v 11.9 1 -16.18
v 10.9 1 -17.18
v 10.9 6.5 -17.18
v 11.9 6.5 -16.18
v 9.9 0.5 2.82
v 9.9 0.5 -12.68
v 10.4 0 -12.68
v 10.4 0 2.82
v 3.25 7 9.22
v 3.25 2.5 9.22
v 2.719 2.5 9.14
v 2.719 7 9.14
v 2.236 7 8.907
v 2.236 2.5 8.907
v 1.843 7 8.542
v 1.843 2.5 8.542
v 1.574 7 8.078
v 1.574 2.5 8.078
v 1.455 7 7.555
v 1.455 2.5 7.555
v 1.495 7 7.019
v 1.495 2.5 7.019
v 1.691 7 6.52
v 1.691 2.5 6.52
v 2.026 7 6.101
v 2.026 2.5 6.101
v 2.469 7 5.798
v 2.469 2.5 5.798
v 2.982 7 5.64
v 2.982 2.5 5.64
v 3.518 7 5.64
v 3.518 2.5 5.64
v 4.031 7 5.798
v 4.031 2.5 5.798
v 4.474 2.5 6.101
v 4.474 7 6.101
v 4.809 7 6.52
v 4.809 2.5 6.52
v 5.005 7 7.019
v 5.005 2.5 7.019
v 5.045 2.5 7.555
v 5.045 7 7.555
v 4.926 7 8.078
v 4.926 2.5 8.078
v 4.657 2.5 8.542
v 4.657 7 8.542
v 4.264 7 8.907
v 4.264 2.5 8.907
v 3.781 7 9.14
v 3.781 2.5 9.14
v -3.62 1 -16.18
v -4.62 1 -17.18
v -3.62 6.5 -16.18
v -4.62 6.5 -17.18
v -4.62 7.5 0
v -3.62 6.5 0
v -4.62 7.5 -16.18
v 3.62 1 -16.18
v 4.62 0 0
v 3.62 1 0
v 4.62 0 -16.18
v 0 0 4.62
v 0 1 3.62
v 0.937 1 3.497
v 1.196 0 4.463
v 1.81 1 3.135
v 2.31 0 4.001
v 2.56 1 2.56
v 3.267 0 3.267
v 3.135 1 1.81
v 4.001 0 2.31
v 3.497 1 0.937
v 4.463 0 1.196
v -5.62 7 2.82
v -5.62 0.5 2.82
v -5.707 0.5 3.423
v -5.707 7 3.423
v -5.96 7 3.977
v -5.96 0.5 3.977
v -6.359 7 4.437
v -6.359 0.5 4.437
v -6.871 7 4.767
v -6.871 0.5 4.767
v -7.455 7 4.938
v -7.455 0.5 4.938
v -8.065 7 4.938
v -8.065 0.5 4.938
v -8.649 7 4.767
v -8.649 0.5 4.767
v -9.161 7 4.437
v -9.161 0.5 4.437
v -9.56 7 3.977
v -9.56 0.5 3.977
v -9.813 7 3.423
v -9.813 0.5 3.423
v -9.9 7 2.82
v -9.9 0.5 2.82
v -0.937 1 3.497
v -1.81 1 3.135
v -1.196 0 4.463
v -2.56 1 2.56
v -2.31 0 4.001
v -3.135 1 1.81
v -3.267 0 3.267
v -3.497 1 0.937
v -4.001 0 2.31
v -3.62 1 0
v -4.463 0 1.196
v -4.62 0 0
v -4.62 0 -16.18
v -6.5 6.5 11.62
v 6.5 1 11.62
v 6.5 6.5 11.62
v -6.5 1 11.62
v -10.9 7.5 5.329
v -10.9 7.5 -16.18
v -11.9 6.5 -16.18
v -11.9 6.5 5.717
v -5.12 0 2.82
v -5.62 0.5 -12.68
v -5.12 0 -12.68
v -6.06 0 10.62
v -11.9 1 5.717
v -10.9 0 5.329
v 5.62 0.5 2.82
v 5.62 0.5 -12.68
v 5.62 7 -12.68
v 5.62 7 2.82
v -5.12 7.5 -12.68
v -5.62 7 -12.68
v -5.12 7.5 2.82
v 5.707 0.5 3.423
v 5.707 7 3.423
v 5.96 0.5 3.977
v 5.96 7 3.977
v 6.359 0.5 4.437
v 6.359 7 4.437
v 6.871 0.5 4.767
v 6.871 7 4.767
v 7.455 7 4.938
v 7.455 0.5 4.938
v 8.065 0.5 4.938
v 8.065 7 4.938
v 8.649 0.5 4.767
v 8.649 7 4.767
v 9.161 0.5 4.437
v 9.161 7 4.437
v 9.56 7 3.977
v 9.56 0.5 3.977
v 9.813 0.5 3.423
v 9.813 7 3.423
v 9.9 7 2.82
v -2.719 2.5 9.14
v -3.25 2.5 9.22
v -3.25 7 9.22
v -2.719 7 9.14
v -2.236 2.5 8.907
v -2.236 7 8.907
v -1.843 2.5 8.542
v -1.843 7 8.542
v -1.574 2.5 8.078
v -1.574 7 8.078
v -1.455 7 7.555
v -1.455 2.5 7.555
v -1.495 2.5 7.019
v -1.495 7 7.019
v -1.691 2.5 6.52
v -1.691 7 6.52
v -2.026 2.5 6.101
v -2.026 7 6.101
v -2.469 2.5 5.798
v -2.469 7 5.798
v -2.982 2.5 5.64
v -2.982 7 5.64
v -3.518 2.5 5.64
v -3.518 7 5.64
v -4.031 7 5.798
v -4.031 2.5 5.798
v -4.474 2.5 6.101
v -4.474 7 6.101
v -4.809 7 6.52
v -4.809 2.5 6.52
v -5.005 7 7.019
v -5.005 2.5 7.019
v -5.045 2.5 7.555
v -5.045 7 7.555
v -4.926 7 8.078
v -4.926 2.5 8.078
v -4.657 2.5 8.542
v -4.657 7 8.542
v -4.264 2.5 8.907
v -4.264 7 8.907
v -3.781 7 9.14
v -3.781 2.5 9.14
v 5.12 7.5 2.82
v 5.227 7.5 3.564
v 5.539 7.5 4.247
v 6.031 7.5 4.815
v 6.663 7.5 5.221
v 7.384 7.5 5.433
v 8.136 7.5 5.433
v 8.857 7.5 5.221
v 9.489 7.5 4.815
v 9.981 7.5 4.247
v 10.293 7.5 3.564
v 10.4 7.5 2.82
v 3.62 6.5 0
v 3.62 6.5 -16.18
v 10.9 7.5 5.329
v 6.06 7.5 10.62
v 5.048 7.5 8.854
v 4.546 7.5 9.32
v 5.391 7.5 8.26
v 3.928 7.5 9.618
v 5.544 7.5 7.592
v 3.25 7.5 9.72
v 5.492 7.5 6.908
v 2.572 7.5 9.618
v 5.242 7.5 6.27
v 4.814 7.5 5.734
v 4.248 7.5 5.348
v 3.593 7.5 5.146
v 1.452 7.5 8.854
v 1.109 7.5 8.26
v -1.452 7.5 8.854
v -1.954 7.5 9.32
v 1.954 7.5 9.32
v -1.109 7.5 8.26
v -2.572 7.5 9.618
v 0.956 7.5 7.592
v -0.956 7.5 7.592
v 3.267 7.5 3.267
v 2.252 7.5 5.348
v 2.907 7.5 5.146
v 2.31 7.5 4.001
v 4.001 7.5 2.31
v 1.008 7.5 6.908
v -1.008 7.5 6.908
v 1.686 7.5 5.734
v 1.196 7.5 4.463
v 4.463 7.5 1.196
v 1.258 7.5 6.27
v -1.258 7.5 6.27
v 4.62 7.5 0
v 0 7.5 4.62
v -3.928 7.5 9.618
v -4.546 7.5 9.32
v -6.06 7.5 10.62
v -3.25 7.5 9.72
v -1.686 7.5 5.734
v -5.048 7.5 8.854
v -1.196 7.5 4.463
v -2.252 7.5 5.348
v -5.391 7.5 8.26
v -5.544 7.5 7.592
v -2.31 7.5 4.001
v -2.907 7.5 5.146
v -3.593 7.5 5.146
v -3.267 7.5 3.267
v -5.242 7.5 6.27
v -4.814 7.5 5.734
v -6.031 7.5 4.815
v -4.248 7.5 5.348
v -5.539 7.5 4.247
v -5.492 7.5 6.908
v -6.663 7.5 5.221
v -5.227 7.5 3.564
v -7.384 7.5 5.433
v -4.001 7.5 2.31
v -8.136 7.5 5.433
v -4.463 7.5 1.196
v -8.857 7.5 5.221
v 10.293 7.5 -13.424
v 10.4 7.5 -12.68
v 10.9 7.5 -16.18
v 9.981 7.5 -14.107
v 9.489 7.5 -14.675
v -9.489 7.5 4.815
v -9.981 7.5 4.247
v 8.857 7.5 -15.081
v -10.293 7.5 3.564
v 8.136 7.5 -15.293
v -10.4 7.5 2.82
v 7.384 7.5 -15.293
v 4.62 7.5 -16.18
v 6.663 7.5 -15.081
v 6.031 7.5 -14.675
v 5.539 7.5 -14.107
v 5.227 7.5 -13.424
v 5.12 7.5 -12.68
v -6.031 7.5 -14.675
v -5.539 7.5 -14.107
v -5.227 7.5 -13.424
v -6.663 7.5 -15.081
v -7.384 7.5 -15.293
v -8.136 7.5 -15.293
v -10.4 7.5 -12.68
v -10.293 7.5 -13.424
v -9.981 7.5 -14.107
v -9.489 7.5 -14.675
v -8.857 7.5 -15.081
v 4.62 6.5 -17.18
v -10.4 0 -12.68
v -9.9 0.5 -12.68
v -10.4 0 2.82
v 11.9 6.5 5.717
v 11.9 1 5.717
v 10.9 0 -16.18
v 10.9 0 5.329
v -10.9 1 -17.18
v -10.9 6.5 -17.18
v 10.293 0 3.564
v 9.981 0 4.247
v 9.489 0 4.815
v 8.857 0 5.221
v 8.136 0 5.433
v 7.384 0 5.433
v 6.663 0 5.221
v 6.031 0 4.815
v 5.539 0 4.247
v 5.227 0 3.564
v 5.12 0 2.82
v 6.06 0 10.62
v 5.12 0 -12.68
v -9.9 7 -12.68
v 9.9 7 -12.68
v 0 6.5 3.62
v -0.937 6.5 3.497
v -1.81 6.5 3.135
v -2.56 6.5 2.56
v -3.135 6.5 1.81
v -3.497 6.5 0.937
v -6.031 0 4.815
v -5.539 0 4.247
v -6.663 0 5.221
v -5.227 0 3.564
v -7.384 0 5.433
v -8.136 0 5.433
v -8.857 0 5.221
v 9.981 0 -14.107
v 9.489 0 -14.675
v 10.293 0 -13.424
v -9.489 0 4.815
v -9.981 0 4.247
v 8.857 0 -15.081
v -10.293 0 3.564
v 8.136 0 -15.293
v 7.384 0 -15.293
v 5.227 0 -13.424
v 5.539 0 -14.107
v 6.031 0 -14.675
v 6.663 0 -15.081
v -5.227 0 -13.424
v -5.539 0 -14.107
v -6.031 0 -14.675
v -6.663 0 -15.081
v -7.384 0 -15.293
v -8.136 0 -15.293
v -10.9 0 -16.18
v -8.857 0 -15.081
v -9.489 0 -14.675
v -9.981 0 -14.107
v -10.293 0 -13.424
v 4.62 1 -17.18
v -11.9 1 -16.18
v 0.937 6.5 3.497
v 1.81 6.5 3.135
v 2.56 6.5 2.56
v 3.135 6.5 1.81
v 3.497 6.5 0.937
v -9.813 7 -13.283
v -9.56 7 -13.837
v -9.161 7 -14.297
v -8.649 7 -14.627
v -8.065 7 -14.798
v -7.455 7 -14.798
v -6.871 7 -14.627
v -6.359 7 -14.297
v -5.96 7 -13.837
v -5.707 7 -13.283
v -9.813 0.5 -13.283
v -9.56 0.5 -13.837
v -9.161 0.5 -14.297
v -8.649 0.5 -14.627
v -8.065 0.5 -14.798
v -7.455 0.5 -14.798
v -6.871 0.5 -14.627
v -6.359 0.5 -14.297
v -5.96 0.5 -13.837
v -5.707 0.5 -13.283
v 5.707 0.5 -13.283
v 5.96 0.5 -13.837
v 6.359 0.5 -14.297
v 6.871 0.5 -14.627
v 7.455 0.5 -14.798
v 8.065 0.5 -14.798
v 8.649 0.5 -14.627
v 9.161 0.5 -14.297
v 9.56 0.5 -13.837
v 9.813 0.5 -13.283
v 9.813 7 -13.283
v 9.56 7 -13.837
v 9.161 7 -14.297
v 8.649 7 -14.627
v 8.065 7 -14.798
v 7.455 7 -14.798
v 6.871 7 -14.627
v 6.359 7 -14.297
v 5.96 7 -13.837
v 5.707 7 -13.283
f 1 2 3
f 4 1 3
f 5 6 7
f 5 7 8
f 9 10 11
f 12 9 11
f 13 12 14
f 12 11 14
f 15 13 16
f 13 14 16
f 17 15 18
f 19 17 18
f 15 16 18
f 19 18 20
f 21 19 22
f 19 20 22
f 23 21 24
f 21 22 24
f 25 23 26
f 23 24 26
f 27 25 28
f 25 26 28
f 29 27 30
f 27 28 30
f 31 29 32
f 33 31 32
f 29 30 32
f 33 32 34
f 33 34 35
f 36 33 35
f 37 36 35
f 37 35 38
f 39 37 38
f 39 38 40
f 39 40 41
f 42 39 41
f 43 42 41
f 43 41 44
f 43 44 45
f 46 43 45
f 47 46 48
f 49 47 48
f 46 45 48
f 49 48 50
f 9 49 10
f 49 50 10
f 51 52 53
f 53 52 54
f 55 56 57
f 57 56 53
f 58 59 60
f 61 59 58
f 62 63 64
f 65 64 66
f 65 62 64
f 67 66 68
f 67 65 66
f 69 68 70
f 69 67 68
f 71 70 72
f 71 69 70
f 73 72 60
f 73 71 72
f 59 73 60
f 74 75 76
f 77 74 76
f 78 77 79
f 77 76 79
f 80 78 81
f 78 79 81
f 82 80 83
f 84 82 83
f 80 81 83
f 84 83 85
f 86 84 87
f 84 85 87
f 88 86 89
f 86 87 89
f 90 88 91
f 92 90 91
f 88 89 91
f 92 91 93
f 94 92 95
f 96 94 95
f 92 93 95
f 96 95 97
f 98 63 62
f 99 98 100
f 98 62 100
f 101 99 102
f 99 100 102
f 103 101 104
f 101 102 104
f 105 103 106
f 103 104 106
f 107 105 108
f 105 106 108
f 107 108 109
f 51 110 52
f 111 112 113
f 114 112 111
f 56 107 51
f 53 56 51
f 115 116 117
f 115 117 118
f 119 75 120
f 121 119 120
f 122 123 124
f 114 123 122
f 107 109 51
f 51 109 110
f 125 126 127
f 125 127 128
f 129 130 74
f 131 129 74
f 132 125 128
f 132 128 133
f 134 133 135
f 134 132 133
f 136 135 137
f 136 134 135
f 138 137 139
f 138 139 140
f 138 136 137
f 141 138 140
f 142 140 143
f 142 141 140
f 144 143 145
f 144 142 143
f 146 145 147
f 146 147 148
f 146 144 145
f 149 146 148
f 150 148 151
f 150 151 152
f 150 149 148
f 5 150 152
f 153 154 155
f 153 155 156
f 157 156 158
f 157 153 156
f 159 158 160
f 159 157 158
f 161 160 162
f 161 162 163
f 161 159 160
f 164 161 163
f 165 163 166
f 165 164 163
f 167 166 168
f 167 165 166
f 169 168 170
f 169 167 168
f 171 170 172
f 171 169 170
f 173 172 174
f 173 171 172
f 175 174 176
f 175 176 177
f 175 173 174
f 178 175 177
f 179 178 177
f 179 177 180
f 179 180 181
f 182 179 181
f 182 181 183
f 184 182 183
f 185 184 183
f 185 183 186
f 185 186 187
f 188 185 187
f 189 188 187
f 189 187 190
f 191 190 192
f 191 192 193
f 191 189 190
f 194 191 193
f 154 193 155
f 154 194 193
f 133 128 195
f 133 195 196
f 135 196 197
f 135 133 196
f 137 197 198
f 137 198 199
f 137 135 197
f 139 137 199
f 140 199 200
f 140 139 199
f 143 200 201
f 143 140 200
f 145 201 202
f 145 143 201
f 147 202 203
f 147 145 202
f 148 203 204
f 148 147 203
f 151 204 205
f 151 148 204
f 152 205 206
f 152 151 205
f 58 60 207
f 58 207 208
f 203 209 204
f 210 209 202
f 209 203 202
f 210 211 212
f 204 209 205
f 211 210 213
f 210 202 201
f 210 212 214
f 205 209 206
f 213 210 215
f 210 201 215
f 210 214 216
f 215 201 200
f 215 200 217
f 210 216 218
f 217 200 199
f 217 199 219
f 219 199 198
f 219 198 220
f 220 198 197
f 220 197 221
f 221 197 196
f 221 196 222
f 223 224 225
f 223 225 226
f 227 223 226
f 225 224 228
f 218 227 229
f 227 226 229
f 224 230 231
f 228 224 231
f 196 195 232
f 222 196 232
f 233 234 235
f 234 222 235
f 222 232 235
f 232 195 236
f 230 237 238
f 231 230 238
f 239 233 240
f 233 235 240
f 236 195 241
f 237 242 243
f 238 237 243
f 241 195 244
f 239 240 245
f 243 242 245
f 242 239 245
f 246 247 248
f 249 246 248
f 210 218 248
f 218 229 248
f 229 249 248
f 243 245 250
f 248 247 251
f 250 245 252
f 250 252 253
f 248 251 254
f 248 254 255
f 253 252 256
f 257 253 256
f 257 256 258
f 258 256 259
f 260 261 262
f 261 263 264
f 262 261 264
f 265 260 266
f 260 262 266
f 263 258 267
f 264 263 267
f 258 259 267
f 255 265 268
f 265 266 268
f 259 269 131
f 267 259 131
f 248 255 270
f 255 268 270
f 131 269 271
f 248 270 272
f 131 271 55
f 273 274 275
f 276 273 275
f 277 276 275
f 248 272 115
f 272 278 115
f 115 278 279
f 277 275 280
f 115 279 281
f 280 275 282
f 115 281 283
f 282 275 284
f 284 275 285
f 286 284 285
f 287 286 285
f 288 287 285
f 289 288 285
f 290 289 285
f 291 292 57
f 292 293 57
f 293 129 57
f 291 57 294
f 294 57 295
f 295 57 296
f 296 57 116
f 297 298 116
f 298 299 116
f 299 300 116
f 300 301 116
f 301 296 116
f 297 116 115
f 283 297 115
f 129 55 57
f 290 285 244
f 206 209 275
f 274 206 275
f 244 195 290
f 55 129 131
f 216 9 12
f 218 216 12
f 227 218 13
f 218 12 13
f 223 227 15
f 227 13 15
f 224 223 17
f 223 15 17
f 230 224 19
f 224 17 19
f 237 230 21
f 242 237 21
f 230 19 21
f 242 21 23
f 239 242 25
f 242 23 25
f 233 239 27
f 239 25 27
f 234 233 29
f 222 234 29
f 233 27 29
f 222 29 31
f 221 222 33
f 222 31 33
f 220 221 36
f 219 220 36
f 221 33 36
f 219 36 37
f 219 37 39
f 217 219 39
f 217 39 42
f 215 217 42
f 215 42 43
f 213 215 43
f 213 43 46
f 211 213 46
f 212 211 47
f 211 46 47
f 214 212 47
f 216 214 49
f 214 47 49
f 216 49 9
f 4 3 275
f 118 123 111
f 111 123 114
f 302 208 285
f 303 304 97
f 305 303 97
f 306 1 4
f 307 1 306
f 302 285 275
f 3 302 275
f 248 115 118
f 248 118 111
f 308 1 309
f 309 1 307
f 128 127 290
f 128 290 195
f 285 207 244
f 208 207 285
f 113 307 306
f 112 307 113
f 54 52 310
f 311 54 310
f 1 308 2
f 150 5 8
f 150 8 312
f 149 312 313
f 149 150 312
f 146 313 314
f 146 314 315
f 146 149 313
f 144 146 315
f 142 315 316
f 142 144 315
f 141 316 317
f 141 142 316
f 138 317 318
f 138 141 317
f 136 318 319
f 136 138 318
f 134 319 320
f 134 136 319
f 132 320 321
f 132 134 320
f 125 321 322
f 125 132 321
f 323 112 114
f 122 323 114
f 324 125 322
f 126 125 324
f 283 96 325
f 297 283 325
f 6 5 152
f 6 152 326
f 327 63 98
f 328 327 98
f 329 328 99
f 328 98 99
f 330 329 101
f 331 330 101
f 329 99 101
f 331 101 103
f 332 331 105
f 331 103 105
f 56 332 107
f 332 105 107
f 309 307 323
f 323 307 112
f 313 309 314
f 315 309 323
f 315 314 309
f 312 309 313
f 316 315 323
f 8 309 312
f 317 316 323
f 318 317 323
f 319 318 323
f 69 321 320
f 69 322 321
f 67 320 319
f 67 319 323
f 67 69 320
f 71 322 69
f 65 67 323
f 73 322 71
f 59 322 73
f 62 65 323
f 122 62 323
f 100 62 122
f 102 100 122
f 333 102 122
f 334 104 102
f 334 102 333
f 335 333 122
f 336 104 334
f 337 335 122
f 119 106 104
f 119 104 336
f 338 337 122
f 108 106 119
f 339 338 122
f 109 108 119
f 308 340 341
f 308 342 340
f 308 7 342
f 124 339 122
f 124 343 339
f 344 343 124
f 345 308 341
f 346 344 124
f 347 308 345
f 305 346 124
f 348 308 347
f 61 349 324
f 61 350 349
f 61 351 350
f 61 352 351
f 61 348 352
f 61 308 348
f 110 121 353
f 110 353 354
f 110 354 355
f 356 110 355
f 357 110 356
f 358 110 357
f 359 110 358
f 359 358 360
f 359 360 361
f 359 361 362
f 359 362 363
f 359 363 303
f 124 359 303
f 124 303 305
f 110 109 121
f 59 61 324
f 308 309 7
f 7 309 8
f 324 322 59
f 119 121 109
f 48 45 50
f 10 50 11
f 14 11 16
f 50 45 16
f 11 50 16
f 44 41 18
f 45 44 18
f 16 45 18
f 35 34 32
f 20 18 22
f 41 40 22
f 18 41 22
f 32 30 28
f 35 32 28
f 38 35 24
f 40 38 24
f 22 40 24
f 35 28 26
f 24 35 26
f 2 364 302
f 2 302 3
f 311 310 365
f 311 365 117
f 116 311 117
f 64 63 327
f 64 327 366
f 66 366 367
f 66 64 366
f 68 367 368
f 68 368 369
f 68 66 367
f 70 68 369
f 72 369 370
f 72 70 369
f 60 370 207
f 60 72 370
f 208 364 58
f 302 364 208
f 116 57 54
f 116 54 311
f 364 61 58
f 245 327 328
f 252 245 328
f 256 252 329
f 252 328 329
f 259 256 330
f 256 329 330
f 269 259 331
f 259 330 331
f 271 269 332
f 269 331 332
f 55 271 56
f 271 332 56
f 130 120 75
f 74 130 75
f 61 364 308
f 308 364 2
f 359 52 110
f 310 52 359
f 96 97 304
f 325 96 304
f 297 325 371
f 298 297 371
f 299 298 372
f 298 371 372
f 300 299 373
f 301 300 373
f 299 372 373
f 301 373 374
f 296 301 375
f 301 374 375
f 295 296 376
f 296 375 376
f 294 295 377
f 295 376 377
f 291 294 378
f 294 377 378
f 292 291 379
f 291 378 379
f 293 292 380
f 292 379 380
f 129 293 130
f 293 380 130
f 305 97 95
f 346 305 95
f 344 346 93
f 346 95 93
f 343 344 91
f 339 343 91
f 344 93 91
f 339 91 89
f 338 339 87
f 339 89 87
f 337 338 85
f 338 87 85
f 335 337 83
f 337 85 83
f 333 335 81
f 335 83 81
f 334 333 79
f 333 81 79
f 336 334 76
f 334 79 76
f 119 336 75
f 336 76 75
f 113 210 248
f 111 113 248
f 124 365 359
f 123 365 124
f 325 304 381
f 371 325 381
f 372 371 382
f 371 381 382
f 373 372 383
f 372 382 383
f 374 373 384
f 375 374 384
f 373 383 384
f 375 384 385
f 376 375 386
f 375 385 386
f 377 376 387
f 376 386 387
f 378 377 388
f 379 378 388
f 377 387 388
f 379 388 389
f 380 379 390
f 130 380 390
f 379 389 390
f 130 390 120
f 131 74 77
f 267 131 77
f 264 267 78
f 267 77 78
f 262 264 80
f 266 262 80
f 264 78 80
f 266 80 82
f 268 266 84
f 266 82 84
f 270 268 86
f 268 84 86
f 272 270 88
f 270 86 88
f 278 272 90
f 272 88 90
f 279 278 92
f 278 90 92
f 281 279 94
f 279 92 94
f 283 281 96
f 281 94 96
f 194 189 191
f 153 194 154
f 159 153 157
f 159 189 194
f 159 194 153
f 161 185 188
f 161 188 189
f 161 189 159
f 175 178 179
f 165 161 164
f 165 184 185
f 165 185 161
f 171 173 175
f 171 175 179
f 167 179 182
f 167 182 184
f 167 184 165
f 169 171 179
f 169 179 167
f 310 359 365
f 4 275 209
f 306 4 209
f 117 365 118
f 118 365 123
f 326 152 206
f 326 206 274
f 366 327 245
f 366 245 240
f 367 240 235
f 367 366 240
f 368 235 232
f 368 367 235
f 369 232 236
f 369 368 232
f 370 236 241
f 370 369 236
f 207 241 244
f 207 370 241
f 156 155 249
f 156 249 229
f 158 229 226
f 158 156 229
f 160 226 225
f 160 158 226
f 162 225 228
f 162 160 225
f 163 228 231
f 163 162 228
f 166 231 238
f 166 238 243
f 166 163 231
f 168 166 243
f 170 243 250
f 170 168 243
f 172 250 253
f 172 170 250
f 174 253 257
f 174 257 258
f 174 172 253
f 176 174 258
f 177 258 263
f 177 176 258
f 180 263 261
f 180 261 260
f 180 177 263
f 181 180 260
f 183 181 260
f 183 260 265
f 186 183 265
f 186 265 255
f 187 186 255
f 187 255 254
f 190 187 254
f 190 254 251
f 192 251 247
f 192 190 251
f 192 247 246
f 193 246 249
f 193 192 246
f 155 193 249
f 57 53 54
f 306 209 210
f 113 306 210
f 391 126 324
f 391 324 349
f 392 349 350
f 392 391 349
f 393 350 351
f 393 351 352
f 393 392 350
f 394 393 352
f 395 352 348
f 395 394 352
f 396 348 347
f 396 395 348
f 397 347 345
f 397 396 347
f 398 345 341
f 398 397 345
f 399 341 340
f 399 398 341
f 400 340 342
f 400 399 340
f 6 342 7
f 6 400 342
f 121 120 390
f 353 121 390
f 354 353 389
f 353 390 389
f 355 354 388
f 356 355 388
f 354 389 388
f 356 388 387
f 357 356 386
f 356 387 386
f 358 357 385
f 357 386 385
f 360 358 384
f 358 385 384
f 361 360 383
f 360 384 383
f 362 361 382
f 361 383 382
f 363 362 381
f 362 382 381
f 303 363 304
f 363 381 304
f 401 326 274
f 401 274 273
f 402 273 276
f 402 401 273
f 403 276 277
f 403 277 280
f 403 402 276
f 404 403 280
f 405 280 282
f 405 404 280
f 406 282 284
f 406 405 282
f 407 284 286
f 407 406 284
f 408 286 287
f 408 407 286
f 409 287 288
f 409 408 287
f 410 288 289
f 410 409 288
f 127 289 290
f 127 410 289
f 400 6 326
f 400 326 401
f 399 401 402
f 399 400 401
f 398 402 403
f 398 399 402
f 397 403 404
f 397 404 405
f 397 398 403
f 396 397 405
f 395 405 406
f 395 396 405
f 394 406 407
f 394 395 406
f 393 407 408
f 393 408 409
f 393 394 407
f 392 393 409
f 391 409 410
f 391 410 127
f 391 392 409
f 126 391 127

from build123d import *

# Parameters (mm, degrees)
SKETCH1_R           = 1.8
BOSS_EXTRUDE1_DEPTH = 2.5
BOSS_EXTRUDE2_START = 2.5
SKETCH1_4_R         = 1.8
BOSS_EXTRUDE2_DEPTH = 5
CHAMFER1_SIZE       = 1
CHAMFER2_SIZE       = 0.5


with BuildPart() as part:
    # Sketch1 → Boss-Extrude1 (new body)
    with BuildSketch(Plane(origin=(0, 0, 0), x_dir=(1, 0, 0), z_dir=(0, 1, 0))):
        with BuildLine():
            Line((0, -11.62), (0, -3.62))
            ThreePointArc((0, -3.62), (-2.559726548, -2.559726548), (-3.62, 0))
            Line((-3.62, 0), (-3.62, 17.18))
            Line((-3.62, 17.18), (-11.9, 17.18))
            Line((-11.9, 17.18), (-11.9, -5.717458175))
            Line((-11.9, -5.717458175), (-6.5, -11.62))
            Line((-6.5, -11.62), (0, -11.62))
        make_face()
        with Locations((-3.25, -7.42)):
            Circle(SKETCH1_R, mode=Mode.SUBTRACT)
        with BuildLine():
            ThreePointArc((-9.9, -2.82), (-7.76, -4.96), (-5.62, -2.82))
            Line((-5.62, -2.82), (-5.62, 12.68))
            ThreePointArc((-5.62, 12.68), (-7.76, 14.82), (-9.9, 12.68))
            Line((-9.9, 12.68), (-9.9, -2.82))
        make_face(mode=Mode.SUBTRACT)
        with Locations((-3.25, -7.42)):
            Circle(SKETCH1_R)
    extrude(amount=BOSS_EXTRUDE1_DEPTH)

    # Sketch1<4> → Boss-Extrude2 (add)
    with BuildSketch(Plane(origin=(0, 0, 0), x_dir=(1, 0, 0), z_dir=(0, 1, 0)).offset(BOSS_EXTRUDE2_START)):
        with BuildLine():
            Line((-3.62, 0), (-3.62, 17.18))
            Line((-3.62, 17.18), (-11.9, 17.18))
            Line((-11.9, 17.18), (-11.9, -5.717458175))
            Line((-11.9, -5.717458175), (-6.5, -11.62))
            Line((-6.5, -11.62), (0, -11.62))
            Line((0, -11.62), (0, -3.62))
            ThreePointArc((0, -3.62), (-2.559726548, -2.559726548), (-3.62, 0))
        make_face()
        with Locations(Location((-3.25, -7.42, 0), (0, 0, 270))):
            Circle(SKETCH1_4_R, mode=Mode.SUBTRACT)
        with BuildLine():
            Line((-5.62, 12.68), (-5.62, -2.82))
            ThreePointArc((-5.62, -2.82), (-7.76, -4.96), (-9.9, -2.82))
            Line((-9.9, -2.82), (-9.9, 12.68))
            ThreePointArc((-9.9, 12.68), (-7.76, 14.82), (-5.62, 12.68))
        make_face(mode=Mode.SUBTRACT)
    extrude(amount=BOSS_EXTRUDE2_DEPTH)

    # Chamfer1
    chamfer1_edges = [part.edges().sort_by_distance(p)[0] for p in [
        (-3.25, 0, 11.62),
        (-9.2, 0, 8.668729087),
        (-11.9, 0, -5.731270913),
        (-7.76, 0, -17.18),
        (-3.62, 0, -8.59),
        (-2.559726548, 0, 2.559726548),
        (-11.9, 3.75, -17.18),
        (-3.62, 3.75, -17.18),
        (-2.559726548, 7.5, 2.559726548),
        (-3.62, 7.5, -8.59),
        (-7.76, 7.5, -17.18),
        (-11.9, 7.5, -5.731270913),
        (-9.2, 7.5, 8.668729087),
        (-3.25, 7.5, 11.62),
    ]]
    chamfer(chamfer1_edges, length=CHAMFER1_SIZE)

    # Chamfer2
    chamfer2_edges = [part.edges().sort_by_distance(p)[0] for p in [
        (-5.62, 0, -4.93),
        (-7.76, 0, -14.82),
        (-9.9, 0, -4.93),
        (-7.76, 0, 4.96),
        (-5.62, 7.5, -4.93),
        (-9.9, 7.5, -4.93),
        (-7.76, 7.5, 4.96),
        (-7.76, 7.5, -14.82),
        (-3.25, 7.5, 5.62),
    ]]
    chamfer(chamfer2_edges, length=CHAMFER2_SIZE)

    # Mirror1: part across plane


with BuildPart() as part_1:
    add(part.part)
    add(part.part.mirror(Plane(origin=(0, 2.5, 0), x_dir=(0, 0, 1), z_dir=(-1, 0, 0))))


solid = part_1.part
